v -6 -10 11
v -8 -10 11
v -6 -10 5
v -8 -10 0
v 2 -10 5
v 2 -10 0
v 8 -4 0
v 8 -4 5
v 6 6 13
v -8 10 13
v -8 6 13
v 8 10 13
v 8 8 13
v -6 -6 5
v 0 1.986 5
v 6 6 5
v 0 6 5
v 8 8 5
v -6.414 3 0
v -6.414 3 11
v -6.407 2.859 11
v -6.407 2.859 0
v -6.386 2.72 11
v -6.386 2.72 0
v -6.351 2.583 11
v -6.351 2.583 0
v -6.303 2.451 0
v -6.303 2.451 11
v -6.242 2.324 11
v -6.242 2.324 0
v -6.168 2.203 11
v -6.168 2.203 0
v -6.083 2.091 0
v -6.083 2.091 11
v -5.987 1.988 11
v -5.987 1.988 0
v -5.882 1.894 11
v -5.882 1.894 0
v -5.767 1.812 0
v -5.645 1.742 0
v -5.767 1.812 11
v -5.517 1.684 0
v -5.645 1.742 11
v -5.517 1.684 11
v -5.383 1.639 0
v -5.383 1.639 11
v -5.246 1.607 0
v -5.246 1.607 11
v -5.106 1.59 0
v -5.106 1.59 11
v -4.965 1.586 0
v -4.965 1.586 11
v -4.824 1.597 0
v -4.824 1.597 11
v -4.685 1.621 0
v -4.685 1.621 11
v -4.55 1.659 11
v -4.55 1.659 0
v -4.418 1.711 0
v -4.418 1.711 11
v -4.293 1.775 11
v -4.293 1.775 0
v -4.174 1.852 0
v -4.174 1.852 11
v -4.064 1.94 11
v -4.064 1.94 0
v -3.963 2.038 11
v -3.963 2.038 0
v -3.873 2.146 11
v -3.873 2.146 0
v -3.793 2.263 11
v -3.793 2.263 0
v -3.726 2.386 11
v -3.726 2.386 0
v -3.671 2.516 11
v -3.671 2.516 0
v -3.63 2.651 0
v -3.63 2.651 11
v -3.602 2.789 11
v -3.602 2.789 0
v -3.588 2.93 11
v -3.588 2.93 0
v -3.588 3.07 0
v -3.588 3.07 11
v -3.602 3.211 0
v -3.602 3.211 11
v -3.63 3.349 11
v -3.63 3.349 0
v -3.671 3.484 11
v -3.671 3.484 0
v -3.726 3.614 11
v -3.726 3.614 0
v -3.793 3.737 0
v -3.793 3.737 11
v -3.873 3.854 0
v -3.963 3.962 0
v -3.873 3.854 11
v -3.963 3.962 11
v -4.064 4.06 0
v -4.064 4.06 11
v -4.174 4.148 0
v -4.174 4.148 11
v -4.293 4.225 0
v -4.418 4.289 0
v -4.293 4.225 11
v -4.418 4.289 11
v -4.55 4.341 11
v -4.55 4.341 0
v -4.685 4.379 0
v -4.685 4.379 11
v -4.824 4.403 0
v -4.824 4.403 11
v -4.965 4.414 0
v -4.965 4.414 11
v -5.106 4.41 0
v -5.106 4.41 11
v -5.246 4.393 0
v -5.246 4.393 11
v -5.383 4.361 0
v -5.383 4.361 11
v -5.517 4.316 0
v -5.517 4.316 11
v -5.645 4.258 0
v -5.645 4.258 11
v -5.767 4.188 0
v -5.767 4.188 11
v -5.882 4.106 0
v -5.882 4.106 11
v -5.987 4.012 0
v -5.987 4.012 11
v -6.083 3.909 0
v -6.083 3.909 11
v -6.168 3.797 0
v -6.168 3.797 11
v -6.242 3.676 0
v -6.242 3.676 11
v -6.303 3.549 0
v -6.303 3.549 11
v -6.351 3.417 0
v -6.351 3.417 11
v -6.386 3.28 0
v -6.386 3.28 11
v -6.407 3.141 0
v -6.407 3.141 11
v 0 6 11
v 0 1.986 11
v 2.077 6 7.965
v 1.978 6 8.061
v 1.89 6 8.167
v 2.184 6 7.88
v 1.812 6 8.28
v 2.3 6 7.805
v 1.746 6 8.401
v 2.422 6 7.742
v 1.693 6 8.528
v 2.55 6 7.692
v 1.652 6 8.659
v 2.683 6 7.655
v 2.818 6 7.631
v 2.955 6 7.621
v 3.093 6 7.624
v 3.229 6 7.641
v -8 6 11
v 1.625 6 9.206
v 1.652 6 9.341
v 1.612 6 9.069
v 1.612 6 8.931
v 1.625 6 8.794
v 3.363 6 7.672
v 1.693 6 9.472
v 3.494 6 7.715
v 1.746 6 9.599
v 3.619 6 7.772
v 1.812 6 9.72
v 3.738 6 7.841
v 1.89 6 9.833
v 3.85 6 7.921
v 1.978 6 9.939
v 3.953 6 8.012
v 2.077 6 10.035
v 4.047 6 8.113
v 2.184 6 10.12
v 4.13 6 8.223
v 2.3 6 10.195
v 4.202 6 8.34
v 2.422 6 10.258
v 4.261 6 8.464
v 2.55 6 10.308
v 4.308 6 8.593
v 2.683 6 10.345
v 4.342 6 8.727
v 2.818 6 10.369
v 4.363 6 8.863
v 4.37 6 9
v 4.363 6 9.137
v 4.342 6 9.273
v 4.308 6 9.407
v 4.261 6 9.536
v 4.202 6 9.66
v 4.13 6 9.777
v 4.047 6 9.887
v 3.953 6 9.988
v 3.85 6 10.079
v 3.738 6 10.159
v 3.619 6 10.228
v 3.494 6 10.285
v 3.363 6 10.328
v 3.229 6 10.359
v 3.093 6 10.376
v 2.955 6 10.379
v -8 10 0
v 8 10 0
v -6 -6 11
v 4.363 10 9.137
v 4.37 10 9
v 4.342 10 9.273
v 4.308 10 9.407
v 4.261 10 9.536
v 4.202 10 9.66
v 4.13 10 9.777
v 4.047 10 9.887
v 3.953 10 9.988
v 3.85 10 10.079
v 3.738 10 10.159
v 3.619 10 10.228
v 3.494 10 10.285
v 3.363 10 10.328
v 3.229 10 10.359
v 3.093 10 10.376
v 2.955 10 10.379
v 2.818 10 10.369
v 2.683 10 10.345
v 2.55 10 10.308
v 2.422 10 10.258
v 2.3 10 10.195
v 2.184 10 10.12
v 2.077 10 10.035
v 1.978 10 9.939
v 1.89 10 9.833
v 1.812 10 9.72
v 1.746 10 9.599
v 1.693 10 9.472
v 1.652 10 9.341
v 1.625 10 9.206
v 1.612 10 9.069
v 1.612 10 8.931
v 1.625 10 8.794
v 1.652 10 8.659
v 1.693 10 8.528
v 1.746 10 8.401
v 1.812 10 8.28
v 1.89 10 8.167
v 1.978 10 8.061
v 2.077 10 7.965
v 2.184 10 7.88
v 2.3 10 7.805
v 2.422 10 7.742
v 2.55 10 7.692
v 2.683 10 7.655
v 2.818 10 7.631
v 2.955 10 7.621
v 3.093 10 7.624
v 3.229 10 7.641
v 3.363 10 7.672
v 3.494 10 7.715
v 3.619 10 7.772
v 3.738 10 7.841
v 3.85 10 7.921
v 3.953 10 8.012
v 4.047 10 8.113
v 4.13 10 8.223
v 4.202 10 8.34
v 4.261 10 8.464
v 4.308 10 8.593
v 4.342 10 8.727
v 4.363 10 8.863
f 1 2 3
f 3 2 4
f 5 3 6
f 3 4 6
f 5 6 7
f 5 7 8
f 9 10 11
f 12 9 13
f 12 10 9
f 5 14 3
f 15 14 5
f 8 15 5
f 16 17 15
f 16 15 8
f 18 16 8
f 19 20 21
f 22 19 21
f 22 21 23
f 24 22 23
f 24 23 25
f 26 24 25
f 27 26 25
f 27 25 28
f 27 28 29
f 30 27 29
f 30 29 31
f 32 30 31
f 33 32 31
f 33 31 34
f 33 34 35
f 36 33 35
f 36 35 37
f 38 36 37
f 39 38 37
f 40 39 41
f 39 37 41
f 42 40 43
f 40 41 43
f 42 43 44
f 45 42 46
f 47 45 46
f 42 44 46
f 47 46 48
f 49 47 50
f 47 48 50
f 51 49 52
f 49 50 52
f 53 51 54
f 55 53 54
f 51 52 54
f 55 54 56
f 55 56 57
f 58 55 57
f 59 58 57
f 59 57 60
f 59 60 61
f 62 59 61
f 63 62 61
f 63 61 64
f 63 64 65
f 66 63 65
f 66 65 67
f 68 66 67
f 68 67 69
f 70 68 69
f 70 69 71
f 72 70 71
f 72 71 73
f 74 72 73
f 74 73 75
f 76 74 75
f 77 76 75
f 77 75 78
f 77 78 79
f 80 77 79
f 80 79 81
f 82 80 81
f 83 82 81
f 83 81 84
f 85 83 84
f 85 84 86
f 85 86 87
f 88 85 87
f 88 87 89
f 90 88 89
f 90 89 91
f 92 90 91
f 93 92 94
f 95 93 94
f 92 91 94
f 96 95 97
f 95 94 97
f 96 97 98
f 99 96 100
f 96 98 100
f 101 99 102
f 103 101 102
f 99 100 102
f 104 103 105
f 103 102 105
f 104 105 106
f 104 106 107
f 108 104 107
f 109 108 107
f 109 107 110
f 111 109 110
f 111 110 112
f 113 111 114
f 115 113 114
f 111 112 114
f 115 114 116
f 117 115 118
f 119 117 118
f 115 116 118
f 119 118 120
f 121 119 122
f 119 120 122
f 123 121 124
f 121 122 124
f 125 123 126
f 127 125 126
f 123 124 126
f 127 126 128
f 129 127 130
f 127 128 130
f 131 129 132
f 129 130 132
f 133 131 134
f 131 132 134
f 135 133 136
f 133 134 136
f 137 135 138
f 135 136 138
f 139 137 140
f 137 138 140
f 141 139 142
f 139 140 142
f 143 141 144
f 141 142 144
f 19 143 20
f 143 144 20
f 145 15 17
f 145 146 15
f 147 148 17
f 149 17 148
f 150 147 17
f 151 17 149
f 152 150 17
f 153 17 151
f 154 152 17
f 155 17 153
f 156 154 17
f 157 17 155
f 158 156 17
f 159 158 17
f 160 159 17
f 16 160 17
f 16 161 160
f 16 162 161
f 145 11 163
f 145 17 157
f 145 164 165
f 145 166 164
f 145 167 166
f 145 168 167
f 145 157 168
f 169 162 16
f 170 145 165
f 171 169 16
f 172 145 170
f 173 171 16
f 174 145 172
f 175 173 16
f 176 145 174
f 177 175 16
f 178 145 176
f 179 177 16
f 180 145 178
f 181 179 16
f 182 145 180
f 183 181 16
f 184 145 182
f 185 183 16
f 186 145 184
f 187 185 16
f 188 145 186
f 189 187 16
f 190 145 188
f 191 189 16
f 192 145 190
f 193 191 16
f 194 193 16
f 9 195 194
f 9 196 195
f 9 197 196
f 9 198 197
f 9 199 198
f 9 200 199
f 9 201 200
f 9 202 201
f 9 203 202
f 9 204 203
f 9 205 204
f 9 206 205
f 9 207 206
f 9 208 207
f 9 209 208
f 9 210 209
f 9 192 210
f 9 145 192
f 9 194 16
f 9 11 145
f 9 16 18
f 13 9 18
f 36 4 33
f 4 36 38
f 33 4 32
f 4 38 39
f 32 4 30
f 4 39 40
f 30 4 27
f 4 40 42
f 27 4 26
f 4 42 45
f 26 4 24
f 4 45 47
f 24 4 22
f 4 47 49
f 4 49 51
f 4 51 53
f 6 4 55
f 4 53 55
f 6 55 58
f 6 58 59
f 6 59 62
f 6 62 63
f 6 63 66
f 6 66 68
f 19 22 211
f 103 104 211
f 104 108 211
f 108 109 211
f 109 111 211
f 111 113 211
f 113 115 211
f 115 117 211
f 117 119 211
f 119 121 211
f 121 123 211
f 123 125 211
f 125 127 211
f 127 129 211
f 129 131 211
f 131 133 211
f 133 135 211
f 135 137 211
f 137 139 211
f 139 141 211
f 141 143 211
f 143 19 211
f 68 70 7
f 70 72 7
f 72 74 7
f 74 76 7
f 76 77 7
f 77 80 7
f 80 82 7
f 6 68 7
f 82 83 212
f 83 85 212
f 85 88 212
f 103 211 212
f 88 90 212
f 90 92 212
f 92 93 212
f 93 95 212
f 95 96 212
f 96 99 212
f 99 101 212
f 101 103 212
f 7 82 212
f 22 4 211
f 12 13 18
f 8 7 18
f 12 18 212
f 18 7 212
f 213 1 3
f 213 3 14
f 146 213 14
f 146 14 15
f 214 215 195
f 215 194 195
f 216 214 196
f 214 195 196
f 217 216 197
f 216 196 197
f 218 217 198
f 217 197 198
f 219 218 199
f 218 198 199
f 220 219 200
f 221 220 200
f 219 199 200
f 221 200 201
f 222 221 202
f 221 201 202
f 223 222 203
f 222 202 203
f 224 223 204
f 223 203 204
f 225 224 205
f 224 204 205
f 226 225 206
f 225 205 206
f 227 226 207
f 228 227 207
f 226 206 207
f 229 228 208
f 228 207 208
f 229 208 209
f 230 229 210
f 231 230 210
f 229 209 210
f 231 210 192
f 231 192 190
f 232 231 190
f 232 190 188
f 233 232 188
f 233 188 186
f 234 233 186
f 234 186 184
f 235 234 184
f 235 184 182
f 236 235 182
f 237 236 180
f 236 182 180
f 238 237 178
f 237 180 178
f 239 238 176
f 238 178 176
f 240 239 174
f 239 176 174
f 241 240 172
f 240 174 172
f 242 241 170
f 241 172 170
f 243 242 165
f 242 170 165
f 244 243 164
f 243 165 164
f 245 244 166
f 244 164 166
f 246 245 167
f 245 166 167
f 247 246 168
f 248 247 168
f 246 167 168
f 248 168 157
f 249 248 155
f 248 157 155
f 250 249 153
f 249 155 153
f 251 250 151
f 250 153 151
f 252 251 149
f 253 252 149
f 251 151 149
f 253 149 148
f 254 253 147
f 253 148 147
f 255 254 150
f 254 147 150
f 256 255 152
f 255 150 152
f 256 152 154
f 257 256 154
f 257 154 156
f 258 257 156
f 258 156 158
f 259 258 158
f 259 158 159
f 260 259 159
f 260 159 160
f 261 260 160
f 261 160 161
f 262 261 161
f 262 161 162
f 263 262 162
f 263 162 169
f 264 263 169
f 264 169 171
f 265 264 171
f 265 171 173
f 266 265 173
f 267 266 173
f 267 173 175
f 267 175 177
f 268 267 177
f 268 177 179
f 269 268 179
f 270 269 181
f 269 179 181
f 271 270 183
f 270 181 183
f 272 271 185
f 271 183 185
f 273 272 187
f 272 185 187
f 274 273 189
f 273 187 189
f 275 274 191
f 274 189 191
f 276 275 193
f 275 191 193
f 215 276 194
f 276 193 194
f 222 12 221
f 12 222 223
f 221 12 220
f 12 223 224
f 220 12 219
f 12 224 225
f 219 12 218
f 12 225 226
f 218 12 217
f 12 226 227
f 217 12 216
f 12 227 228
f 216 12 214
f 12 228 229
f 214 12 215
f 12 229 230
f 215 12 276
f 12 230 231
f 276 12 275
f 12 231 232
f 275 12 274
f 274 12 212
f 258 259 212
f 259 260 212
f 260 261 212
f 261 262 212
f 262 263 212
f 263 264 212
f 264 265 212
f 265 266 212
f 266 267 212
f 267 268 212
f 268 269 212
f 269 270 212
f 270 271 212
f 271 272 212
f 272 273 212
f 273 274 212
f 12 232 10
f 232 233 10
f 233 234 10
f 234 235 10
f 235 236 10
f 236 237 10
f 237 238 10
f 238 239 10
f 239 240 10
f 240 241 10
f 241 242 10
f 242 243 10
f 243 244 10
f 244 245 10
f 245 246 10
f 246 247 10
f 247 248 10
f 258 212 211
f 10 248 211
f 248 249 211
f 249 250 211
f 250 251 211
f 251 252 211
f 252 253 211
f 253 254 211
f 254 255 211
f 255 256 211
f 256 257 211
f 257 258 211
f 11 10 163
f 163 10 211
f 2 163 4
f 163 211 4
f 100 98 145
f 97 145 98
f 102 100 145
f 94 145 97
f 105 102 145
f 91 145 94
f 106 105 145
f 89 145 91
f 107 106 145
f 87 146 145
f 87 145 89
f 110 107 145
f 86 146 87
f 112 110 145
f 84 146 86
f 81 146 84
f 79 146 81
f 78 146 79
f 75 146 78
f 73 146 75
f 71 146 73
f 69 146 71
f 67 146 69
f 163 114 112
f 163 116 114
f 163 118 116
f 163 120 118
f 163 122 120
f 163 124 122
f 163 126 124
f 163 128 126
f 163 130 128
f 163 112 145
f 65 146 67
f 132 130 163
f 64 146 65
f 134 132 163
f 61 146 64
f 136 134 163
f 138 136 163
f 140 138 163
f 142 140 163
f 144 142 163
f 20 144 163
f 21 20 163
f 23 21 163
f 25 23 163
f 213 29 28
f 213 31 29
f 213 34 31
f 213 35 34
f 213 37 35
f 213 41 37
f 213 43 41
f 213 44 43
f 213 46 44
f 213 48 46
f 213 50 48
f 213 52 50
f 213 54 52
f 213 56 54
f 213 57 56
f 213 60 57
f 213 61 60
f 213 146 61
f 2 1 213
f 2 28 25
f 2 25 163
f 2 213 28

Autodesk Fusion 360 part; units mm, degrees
sketch "Sketch1" plane through (0, 0, 0) normal (0, 0, 1) x (1, 0, 0)
  line L0 (8, 10) -> (-8, 10)
  line L1 (-8, 10) -> (-8, -10)
  line L2 (-8, -10) -> (8, -10)
  line L3 (8, -10) -> (8, 10)
  line L4 (8, 10) -> (-8, -10) construction
  line L5 (-8, 10) -> (8, -10) construction
  dimension "d1" = 16
  dimension "d2" = 20
extrude "Extrude1" add sketch "Sketch1" along normal blind 13
sketch "Sketch2" plane through (8, 0, 0) normal (1, 0, 0) x (0, 1, 0)
  line L0 (-10, 0) -> (10, 0)
  line L1 (10, 0) -> (10, 13)
  line L2 (10, 13) -> (-10, 13)
  line L3 (-10, 13) -> (-10, 0)
sketch "Sketch3" plane through (0, 10, 0) normal (0, 1, 0) x (-1, 0, 0)
  line L0 (-8, 0) -> (8, 0)
  line L1 (8, 0) -> (8, 13)
  line L2 (8, 13) -> (-8, 13)
  line L3 (-8, 13) -> (-8, 0)
sketch "Sketch4" plane through (0, 0, 13) normal (0, 0, 1) x (-1, 0, 0)
  line L0 (-8, 10) -> (-8, -10)
  line L1 (-8, -10) -> (8, -10)
  line L2 (8, -10) -> (8, 10)
  line L3 (8, 10) -> (-8, 10)
  line L4 (8, -6) -> (-8, -6)
  line L5 (-8, -6) -> (-8, 10)
  line L6 (-8, 10) -> (8, 10)
  line L7 (8, 10) -> (8, -6)
  line L8 (8, -6) -> (-8, 10) construction
  line L9 (-8, -6) -> (8, 10) construction
  point P0 (0, 2)
  dimension "d5" = 16
  dimension "d6" = 16
extrude "Extrude2" cut sketch "Sketch4" against normal blind 2 contours L0 L2 L3 L4 L5 L6 L7
sketch "Sketch5" plane through (0, 0, 11) normal (0, 0, 1) x (-1, 0, 0)
  line L0 (8, 10) -> (-8, 10)
  line L1 (-8, 10) -> (-8, -6)
  line L2 (-8, -6) -> (8, -6)
  line L3 (8, -6) -> (8, 10)
  line L4 (0, -6) -> (-8, -6)
  line L5 (-8, -6) -> (-8, 10)
  line L6 (-8, 10) -> (0, 10)
  line L7 (0, 10) -> (0, -6)
  line L8 (0, -6) -> (-8, 10) construction
  line L9 (-8, -6) -> (0, 10) construction
  point P0 (-4, 2)
  dimension "d9" = 8
  dimension "d10" = 16
extrude "Extrude3" cut sketch "Sketch5" against normal blind 6 contours L0 L1 L2 L4 L5 L6 L7
sketch "Sketch6" plane through (0, 0, 11) normal (0, 0, 1) x (-1, 0, 0)
  line L0 (0, 10) -> (0, -6)
  line L1 (0, -6) -> (8, -6)
  line L2 (8, -6) -> (8, 10)
  line L3 (8, 10) -> (0, 10)
  line L4 (6, 6) -> (0, 6)
  line L5 (0, 6) -> (0, 10)
  line L6 (0, 10) -> (6, 10)
  line L7 (6, 10) -> (6, 6)
  line L8 (6, 6) -> (0, 10) construction
  line L9 (0, 6) -> (6, 10) construction
  point P0 (3, 8)
  dimension "d13" = 6
  dimension "d14" = 4
extrude "Extrude4" cut sketch "Sketch6" against normal blind 6 contours L0 L3 L4 L5 L6 L7
sketch "Sketch7" plane through (0, 0, 11) normal (0, 0, 1) x (-1, 0, 0)
  line L0 (6, 6) -> (0, 6)
  line L1 (0, 6) -> (0, -6)
  line L2 (0, -6) -> (8, -6)
  line L3 (8, -6) -> (8, 10)
  line L4 (8, 10) -> (6, 10)
  line L5 (6, 10) -> (6, 6)
  line L6 (6, 6) -> (0, -1.9864)
  line L7 (0, 6) -> (0, -1.9864)
extrude "Extrude5" cut sketch "Sketch7" against normal blind 6 contours L0 L1 L6 L7
sketch "Sketch8" plane through (0, 0, 13) normal (0, 0, 1) x (-1, 0, 0)
  line L0 (8, -6) -> (-8, -6)
  line L1 (-8, -6) -> (-8, -10)
  line L2 (-8, -10) -> (8, -10)
  line L3 (8, -10) -> (8, -6)
sketch "Sketch9" plane through (0, 0, 13) normal (0, 0, 1) x (1, 0, 0)
  line L0 (6, 6) -> (8, 8)
  line L1 (8, 8) -> (8, 6)
  line L2 (8, 6) -> (6, 6)
extrude "Extrude6" cut sketch "Sketch9" against normal blind 8
chamfer "Chamfer1" distance 6 angle 45 1 edges at (8, -10, 2.5)
sketch "Sketch10" plane through (0, 6, 0) normal (0, -1, 0) x (1, 0, 0)
  line L0 (6, 5) -> (6, 13)
  line L1 (6, 13) -> (-8, 13)
  line L2 (-8, 13) -> (-8, 11)
  line L3 (-8, 11) -> (0, 11)
  line L4 (0, 11) -> (0, 5)
  line L5 (0, 5) -> (6, 5)
  circle A0 centre (2.9897, 9) radius 1.3799
extrude "Extrude7" cut sketch "Sketch10" against normal blind 4 contours A0
sketch "Sketch11" plane through (0, 0, 11) normal (0, 0, 1) x (-1, 0, 0)
  line L0 (6, 6) -> (0, -1.9864)
  line L1 (0, -1.9864) -> (0, -6)
  line L2 (0, -6) -> (8, -6)
  line L3 (8, -6) -> (8, 10)
  line L4 (8, 10) -> (6, 10)
  line L5 (6, 10) -> (6, 6)
  circle A0 centre (5, -3) radius 1.4142
extrude "Extrude8" cut sketch "Sketch11" against normal blind 11 contours A0
